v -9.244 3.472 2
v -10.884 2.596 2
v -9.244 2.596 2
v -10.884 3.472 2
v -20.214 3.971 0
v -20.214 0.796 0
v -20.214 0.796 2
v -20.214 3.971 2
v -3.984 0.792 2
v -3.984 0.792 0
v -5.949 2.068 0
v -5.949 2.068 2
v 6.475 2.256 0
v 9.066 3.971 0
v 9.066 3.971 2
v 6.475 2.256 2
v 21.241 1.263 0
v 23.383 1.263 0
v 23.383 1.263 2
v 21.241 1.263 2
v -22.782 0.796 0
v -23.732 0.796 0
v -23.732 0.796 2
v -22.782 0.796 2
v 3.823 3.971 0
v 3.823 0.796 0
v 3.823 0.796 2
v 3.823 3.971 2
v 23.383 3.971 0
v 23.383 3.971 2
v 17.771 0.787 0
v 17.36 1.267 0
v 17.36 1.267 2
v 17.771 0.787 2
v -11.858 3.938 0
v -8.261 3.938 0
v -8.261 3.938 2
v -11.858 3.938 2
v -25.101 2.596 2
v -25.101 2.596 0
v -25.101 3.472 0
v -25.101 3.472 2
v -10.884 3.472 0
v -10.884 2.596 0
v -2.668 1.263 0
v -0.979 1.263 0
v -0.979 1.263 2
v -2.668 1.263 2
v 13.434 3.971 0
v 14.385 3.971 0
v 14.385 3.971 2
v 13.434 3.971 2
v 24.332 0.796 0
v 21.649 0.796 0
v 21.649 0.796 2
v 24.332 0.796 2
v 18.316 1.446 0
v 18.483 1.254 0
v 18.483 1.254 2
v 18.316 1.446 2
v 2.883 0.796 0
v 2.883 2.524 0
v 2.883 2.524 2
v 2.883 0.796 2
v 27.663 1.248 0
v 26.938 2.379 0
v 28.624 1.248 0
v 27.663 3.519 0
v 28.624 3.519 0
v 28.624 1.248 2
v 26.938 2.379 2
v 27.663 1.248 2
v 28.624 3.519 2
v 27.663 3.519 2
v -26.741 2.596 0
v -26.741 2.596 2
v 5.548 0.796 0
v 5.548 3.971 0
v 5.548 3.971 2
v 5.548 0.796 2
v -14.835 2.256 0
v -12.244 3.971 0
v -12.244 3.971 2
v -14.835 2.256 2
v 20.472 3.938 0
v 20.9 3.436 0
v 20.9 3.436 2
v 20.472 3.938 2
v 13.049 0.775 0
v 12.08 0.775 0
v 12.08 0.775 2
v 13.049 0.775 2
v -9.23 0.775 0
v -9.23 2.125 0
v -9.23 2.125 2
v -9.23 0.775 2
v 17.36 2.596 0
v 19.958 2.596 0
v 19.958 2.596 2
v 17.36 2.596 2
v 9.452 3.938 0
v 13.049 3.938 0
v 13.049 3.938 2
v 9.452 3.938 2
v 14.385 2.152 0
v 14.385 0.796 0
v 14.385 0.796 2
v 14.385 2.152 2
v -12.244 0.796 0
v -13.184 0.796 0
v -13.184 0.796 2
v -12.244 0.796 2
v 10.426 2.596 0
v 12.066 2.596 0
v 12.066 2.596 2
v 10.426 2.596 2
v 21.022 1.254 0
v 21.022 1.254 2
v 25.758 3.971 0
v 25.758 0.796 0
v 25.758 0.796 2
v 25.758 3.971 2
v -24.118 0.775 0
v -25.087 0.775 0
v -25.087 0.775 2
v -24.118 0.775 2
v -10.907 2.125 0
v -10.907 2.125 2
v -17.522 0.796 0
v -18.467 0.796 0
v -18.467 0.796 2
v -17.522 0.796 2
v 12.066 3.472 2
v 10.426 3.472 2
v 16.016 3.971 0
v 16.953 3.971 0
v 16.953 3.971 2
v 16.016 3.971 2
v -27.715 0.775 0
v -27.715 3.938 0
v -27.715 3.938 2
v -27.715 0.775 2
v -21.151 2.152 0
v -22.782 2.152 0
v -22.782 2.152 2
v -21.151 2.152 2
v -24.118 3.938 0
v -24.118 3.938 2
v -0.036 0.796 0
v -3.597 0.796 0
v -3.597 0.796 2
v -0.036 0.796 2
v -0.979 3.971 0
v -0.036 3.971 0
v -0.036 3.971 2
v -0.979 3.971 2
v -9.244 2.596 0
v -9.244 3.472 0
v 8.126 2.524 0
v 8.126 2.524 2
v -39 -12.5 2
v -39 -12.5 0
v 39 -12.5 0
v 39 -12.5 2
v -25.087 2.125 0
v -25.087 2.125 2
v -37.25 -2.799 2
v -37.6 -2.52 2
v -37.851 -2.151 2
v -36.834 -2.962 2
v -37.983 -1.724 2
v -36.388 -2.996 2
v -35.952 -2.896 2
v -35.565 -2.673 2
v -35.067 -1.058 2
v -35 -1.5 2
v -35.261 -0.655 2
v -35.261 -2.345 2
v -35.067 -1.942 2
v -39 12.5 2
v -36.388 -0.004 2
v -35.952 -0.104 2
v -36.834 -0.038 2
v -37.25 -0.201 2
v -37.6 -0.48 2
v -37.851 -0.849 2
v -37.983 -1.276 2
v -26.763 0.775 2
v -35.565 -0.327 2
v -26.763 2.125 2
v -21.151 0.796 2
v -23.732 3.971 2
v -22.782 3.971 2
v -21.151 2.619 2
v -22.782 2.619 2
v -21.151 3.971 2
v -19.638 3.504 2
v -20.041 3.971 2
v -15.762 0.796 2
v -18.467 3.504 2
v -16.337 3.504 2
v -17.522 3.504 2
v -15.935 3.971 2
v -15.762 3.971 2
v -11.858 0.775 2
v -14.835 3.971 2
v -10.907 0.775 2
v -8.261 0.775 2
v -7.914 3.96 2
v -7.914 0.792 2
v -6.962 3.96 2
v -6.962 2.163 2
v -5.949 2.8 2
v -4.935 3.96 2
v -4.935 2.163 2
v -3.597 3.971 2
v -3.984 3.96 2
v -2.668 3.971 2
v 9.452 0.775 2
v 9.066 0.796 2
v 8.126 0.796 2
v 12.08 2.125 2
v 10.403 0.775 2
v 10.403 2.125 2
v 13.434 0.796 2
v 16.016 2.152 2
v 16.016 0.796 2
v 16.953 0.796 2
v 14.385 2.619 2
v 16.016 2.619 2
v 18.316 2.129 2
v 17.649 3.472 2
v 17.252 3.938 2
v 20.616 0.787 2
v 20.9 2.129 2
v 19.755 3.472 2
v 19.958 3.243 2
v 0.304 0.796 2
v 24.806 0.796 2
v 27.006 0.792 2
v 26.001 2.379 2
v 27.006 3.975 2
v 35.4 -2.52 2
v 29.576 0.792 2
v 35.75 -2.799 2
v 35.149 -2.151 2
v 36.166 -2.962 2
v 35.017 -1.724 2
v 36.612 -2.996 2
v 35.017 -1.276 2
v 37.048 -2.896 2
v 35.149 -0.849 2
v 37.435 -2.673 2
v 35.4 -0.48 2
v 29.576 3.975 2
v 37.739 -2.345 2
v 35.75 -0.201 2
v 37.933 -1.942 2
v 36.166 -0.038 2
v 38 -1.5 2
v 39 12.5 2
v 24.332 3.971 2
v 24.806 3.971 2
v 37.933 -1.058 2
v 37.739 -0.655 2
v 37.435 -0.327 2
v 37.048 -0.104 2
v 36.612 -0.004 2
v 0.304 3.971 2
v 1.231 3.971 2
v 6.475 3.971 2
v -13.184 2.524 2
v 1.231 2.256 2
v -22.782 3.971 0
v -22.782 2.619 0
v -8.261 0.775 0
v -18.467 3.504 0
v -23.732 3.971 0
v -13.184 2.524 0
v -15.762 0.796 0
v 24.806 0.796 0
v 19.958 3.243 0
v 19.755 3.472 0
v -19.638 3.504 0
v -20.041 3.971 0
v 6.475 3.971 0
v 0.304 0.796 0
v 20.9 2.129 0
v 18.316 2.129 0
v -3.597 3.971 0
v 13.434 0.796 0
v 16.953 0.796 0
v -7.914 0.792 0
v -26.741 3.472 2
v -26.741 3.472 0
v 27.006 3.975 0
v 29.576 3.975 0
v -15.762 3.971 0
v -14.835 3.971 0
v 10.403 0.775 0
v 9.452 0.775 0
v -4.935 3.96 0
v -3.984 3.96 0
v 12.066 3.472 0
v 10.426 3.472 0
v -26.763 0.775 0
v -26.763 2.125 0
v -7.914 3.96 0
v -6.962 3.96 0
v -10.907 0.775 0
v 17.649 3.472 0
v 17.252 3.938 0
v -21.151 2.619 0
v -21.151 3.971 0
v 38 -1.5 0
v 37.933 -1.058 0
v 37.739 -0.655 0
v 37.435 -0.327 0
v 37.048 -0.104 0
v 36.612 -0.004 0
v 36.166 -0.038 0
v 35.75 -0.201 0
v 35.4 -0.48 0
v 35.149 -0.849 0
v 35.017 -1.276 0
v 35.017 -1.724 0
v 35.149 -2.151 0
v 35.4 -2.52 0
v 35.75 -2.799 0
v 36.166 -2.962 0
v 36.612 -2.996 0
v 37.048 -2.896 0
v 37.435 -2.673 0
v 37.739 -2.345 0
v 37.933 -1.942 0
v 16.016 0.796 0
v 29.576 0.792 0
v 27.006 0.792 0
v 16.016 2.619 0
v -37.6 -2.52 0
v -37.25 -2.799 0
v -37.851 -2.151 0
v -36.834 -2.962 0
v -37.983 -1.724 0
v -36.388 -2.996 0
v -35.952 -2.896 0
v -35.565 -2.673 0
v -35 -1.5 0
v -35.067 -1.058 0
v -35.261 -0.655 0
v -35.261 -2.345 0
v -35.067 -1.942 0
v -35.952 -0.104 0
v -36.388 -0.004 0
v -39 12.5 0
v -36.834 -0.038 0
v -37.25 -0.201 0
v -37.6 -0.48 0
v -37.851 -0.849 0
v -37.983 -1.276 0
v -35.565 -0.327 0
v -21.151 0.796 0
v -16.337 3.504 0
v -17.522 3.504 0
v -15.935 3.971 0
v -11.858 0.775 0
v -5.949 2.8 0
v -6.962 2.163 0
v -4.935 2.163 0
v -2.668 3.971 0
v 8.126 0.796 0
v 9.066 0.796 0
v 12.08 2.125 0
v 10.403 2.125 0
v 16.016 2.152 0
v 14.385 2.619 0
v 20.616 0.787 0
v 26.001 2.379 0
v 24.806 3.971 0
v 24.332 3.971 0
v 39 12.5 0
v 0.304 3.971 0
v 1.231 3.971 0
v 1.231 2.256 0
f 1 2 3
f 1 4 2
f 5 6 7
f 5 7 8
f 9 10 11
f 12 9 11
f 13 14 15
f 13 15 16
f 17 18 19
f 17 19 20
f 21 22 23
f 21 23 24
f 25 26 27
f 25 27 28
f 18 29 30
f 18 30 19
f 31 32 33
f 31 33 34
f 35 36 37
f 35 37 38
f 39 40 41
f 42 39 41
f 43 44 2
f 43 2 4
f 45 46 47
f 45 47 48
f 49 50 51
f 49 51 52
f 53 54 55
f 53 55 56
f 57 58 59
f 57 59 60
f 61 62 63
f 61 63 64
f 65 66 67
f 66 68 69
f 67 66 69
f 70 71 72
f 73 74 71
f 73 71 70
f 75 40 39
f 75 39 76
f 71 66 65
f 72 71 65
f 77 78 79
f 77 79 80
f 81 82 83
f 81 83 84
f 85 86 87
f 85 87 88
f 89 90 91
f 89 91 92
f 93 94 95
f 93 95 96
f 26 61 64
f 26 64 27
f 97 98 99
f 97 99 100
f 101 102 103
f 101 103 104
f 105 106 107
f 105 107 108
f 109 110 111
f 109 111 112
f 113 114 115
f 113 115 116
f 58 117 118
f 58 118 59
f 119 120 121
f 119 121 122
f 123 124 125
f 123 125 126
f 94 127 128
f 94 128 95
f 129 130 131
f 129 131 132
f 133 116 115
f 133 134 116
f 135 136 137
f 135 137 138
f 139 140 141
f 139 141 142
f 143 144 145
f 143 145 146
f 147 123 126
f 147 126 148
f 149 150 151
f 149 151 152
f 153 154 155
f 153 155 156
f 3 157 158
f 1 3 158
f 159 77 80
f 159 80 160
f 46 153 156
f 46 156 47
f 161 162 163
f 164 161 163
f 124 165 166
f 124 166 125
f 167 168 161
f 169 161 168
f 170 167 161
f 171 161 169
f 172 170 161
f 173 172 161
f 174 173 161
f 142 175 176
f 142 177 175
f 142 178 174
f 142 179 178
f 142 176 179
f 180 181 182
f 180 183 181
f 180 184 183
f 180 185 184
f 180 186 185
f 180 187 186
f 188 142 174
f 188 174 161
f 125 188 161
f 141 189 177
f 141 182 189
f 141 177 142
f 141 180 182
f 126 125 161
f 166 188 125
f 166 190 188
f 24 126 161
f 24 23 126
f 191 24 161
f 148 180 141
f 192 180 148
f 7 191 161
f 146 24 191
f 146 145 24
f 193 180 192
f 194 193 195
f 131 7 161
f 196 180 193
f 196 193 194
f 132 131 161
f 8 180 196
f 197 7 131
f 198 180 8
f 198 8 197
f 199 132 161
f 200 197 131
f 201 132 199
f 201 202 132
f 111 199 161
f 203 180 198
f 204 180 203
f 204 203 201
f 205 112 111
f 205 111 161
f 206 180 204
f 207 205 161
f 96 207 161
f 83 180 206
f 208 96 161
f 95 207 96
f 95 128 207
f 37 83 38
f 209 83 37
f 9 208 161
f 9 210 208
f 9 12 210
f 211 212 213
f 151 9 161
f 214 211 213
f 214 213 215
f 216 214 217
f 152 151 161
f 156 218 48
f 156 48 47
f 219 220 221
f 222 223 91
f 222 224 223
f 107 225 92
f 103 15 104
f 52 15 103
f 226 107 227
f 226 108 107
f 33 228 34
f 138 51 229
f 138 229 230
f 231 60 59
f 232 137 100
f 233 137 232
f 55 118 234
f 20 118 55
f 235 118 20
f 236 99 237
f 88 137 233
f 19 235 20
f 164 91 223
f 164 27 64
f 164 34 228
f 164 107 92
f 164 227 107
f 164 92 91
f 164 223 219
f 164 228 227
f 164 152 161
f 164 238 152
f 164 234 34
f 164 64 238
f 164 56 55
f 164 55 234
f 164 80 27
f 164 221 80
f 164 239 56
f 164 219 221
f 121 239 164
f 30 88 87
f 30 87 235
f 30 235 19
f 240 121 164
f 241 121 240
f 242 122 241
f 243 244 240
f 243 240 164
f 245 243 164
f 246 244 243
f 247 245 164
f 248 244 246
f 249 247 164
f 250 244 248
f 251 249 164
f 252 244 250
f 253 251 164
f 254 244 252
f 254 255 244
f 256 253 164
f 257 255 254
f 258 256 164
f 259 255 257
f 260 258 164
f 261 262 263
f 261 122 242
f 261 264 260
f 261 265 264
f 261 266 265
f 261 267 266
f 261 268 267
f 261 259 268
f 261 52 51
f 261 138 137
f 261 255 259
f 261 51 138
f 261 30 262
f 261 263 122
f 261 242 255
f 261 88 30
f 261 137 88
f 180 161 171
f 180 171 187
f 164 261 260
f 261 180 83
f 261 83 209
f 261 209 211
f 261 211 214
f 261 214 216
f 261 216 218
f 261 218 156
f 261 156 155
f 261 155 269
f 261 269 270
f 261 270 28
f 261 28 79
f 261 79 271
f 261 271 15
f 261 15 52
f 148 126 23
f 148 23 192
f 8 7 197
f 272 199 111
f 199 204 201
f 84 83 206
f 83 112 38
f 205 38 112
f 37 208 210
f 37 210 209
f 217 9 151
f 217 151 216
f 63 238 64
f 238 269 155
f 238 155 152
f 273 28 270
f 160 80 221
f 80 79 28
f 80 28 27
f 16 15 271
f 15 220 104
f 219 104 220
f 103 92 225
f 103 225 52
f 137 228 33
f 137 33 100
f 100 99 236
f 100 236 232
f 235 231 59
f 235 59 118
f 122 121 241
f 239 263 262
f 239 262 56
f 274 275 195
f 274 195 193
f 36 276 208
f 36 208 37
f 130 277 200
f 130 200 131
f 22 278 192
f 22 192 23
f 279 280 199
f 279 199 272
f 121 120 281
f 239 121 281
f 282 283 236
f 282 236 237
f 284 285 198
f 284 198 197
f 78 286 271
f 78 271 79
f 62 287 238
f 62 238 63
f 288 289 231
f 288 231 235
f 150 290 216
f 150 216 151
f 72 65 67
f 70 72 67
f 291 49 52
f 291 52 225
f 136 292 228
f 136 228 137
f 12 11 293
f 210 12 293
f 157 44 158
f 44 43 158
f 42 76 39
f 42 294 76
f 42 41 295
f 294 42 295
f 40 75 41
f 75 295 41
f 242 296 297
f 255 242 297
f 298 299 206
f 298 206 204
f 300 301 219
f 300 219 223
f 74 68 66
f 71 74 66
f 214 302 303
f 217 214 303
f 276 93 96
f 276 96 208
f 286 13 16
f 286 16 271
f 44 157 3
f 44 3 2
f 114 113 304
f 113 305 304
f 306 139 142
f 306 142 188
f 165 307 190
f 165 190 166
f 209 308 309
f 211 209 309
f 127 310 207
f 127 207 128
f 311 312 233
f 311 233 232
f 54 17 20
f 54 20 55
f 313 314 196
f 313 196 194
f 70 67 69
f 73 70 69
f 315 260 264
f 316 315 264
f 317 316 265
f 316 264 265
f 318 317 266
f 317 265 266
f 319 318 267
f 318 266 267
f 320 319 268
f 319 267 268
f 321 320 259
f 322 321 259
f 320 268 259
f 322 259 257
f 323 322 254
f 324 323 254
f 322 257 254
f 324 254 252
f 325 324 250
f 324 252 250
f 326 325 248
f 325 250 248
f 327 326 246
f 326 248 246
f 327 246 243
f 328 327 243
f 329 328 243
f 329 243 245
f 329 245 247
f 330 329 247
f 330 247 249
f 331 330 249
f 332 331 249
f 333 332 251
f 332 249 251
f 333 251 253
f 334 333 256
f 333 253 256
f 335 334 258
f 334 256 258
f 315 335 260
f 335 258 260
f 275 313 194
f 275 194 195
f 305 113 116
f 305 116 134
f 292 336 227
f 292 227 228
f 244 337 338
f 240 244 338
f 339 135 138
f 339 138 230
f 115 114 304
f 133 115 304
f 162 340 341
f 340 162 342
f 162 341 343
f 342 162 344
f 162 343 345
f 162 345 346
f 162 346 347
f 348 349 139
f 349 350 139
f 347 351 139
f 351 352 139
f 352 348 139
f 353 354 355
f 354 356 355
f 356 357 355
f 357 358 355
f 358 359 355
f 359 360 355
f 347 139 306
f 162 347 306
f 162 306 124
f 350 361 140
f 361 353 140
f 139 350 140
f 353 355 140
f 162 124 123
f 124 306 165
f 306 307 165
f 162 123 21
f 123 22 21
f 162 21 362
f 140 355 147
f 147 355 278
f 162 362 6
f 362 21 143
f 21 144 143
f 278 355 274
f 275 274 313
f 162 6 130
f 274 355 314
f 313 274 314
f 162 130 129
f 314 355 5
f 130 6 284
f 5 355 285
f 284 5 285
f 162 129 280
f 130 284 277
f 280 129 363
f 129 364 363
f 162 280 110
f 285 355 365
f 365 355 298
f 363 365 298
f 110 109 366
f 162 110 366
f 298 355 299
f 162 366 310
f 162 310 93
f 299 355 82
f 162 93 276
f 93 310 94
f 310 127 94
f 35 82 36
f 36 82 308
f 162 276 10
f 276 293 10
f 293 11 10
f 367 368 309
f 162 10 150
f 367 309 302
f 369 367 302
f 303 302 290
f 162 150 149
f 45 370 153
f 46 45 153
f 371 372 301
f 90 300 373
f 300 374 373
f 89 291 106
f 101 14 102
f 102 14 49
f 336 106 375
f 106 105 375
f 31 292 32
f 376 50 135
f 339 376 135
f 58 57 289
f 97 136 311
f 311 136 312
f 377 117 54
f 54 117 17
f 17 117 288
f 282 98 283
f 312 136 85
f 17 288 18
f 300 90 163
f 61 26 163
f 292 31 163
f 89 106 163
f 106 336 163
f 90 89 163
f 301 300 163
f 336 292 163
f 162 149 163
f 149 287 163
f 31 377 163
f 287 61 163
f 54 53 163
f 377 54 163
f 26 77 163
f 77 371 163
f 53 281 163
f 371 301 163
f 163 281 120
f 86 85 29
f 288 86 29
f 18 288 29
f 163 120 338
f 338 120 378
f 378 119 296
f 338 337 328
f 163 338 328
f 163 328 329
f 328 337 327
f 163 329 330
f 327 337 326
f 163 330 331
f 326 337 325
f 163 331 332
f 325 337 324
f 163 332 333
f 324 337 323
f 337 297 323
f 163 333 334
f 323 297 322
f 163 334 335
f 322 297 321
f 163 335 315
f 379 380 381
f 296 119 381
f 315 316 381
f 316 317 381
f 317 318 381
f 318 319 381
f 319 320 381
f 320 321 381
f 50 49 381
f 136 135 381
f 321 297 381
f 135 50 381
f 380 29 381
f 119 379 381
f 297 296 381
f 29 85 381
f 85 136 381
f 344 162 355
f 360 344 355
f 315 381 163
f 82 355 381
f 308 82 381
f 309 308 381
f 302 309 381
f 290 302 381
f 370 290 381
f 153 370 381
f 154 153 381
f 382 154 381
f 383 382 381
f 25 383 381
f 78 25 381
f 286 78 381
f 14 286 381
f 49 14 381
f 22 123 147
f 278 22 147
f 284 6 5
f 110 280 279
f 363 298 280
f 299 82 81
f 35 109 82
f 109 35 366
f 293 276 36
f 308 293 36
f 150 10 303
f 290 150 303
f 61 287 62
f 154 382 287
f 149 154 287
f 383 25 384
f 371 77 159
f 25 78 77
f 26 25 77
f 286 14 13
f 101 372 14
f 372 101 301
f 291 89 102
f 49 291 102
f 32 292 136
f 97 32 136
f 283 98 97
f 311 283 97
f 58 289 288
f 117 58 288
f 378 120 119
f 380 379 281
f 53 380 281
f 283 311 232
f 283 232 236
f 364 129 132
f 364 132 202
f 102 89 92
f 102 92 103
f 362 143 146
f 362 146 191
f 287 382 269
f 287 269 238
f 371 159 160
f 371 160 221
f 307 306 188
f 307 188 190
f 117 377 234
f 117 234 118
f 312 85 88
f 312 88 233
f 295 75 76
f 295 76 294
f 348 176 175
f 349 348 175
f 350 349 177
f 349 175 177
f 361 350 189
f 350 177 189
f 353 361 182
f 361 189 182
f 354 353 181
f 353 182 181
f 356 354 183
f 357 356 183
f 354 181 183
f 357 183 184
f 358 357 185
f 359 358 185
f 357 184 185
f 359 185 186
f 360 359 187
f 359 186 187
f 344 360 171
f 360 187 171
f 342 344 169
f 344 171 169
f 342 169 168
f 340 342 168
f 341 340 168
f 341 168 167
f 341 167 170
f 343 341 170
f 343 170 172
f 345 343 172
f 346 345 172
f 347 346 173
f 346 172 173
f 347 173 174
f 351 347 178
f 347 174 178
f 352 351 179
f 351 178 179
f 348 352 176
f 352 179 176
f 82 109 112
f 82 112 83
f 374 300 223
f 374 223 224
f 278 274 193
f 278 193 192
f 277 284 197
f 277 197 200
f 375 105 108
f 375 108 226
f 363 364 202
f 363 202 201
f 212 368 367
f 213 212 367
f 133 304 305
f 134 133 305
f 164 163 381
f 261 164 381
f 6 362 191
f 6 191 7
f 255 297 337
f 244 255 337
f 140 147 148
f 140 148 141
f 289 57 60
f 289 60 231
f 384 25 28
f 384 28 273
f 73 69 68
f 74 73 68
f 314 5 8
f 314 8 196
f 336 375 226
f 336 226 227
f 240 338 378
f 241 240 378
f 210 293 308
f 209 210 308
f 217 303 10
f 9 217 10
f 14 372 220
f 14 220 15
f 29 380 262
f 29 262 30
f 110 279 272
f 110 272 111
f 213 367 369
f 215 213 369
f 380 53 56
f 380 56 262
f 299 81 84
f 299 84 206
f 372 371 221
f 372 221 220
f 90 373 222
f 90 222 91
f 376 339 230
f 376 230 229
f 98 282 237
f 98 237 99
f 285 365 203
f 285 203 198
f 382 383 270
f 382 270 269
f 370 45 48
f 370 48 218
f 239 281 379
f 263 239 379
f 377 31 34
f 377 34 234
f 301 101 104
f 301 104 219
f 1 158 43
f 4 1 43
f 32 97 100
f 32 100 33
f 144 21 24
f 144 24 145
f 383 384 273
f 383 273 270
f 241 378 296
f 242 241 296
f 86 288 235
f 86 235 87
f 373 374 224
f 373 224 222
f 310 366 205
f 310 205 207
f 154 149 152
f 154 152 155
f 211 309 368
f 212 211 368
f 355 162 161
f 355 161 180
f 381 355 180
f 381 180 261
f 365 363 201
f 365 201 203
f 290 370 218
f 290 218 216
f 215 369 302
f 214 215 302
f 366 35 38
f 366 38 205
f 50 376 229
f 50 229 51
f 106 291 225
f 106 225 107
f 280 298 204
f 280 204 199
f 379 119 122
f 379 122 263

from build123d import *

# Parameters (mm, degrees)
SKETCH1_W           = 78
SKETCH1_H           = 25
BOSS_EXTRUDE1_DEPTH = 2
SKETCH2_R           = 1.5
CUT_EXTRUDE1_DEPTH  = 2
SKETCH3_W           = 0.951714292
SKETCH3_H           = 3.175
SKETCH3_W_2         = 1.64005667
SKETCH3_H_2         = 0.875681432
SKETCH3_W_3         = 1.640056671
CUT_EXTRUDE2_DEPTH  = 2


with BuildPart() as part:
    # Sketch1 → Boss-Extrude1 (new body)
    with BuildSketch(Plane.XY):
        Rectangle(SKETCH1_W, SKETCH1_H)
    extrude(amount=BOSS_EXTRUDE1_DEPTH)

    # Sketch2 → Cut-Extrude1 (cut)
    with BuildSketch(Plane.XY.offset(2)):
        with Locations((-36.5, -1.5)):
            Circle(SKETCH2_R)
        with Locations((36.5, -1.5)):
            Circle(SKETCH2_R)
    extrude(amount=-CUT_EXTRUDE1_DEPTH, mode=Mode.SUBTRACT)

    # Sketch3 → Cut-Extrude2 (cut)
    # profile 1 of 15: a face of its own
    with BuildSketch(Plane(origin=(0, 0, 0), x_dir=(-1, 0, 0), z_dir=(0, 0, -1))):
        Polygon((-29.575505362, 3.974938648), (-29.575505362, 0.792073246), (-27.006387116, 0.792073246), (-26.000606506, 2.378841305), (-27.006387116, 3.974938648), align=None)
        Polygon((-28.62379107, 3.518744687), (-27.663315893, 3.518744687), (-26.938428967, 2.378841305), (-27.663315893, 1.248266567), (-28.62379107, 1.248266567), align=None, mode=Mode.SUBTRACT)
    # profile 2 of 15: a face of its own
    with BuildSketch(Plane(origin=(0, 0, 0), x_dir=(-1, 0, 0), z_dir=(0, 0, -1))):
        with Locations((-25.282306406, 2.383505947)):
            Rectangle(SKETCH3_W, SKETCH3_H)
    # profile 3 of 15: a face of its own
    with BuildSketch(Plane(origin=(0, 0, 0), x_dir=(-1, 0, 0), z_dir=(0, 0, -1))):
        Polygon((-21.240800957, 1.263179338), (-21.649435094, 0.796005947), (-24.331903974, 0.796005947), (-24.331903974, 3.971005947), (-23.383281308, 3.971005947), (-23.383281308, 1.263179338), align=None)
    # profile 4 of 15: a face of its own
    with BuildSketch(Plane(origin=(0, 0, 0), x_dir=(-1, 0, 0), z_dir=(0, 0, -1))):
        Polygon((-17.360231248, 1.266912972), (-17.770588503, 0.786863569), (-20.616032764, 0.786863569), (-21.021880599, 1.253509528), (-18.483076923, 1.253509528), (-18.316228369, 1.445625558), (-18.316228369, 2.1291916), (-20.900126248, 2.1291916), (-20.900126248, 3.435661897), (-20.471731312, 3.938198874), (-17.251731841, 3.938198874), (-17.648834152, 3.471552915), (-19.754733471, 3.471552915), (-19.957657388, 3.242555011), (-19.957657388, 2.595871483), (-17.360231248, 2.595871483), align=None)
    # profile 5 of 15: a face of its own
    with BuildSketch(Plane(origin=(0, 0, 0), x_dir=(-1, 0, 0), z_dir=(0, 0, -1))):
        Polygon((-13.434390031, 3.971005947), (-13.434390031, 0.796005947), (-14.385030255, 0.796005947), (-14.385030255, 2.152169481), (-16.015818451, 2.152169481), (-16.015818451, 0.796005947), (-16.952845922, 0.796005947), (-16.952845922, 3.971005947), (-16.015818451, 3.971005947), (-16.015818451, 2.619342872), (-14.385030255, 2.619342872), (-14.385030255, 3.971005947), align=None)
    # profile 6 of 15: a face of its own
    with BuildSketch(Plane(origin=(0, 0, 0), x_dir=(-1, 0, 0), z_dir=(0, 0, -1))):
        Polygon((-9.451803728, 3.938198874), (-9.451803728, 0.774593081), (-10.403217818, 0.774593081), (-10.403217818, 2.124694981), (-12.079518835, 2.124694981), (-12.079518835, 0.774593081), (-13.049055099, 0.774593081), (-13.049055099, 3.938198874), align=None)
        with Locations((-11.24589887, 3.033712199)):
            Rectangle(SKETCH3_W_2, SKETCH3_H_2, mode=Mode.SUBTRACT)
    # profile 7 of 15: a face of its own
    with BuildSketch(Plane(origin=(0, 0, 0), x_dir=(-1, 0, 0), z_dir=(0, 0, -1))):
        Polygon((-5.548013544, 0.796005947), (-8.12614103, 2.524093928), (-8.12614103, 0.796005947), (-9.066469435, 0.796005947), (-9.066469435, 3.971005947), (-6.474942346, 2.256489753), (-6.474942346, 3.971005947), (-5.548013544, 3.971005947), align=None)
    # profile 8 of 15: a face of its own
    with BuildSketch(Plane(origin=(0, 0, 0), x_dir=(-1, 0, 0), z_dir=(0, 0, -1))):
        Polygon((-0.304412157, 0.796005947), (-2.882539642, 2.524093928), (-2.882539642, 0.796005947), (-3.822868048, 0.796005947), (-3.822868048, 3.971005947), (-1.231340959, 2.256489753), (-1.231340959, 3.971005947), (-0.304412157, 3.971005947), align=None)
    # profile 9 of 15: a face of its own
    with BuildSketch(Plane(origin=(0, 0, 0), x_dir=(-1, 0, 0), z_dir=(0, 0, -1))):
        Polygon((3.596827915, 3.971005947), (3.596827915, 0.796005947), (0.036422573, 0.796005947), (0.036422573, 3.971005947), (0.978642439, 3.971005947), (0.978642439, 1.263179338), (2.668296333, 1.263179338), (2.668296333, 3.971005947), align=None)
    # profile 10 of 15: a face of its own
    with BuildSketch(Plane(origin=(0, 0, 0), x_dir=(-1, 0, 0), z_dir=(0, 0, -1))):
        Polygon((5.948522329, 2.06770026), (7.913622117, 0.792072606), (7.913622117, 3.960191659), (6.961908466, 3.960191659), (6.961908466, 2.162693809), (5.948522329, 2.800372577), (4.93525781, 2.162693809), (4.93525781, 3.960191659), (3.983543518, 3.960191659), (3.983543518, 0.792072606), align=None)
    # profile 11 of 15: a face of its own
    with BuildSketch(Plane(origin=(0, 0, 0), x_dir=(-1, 0, 0), z_dir=(0, 0, -1))):
        Polygon((11.858192311, 3.938198874), (11.858192311, 0.774593081), (10.90677822, 0.774593081), (10.90677822, 2.124694981), (9.230477204, 2.124694981), (9.230477204, 0.774593081), (8.26094094, 0.774593081), (8.26094094, 3.938198874), align=None)
        with Locations((10.064097169, 3.033712199)):
            Rectangle(SKETCH3_W_3, SKETCH3_H_2, mode=Mode.SUBTRACT)
    # profile 12 of 15: a face of its own
    with BuildSketch(Plane(origin=(0, 0, 0), x_dir=(-1, 0, 0), z_dir=(0, 0, -1))):
        Polygon((15.761982494, 0.796005947), (13.183855009, 2.524093928), (13.183855009, 0.796005947), (12.243526603, 0.796005947), (12.243526603, 3.971005947), (14.835053692, 2.256489753), (14.835053692, 3.971005947), (15.761982494, 3.971005947), align=None)
    # profile 13 of 15: a face of its own
    with BuildSketch(Plane(origin=(0, 0, 0), x_dir=(-1, 0, 0), z_dir=(0, 0, -1))):
        Polygon((19.638198324, 3.503797351), (18.467108571, 3.503797351), (18.467108571, 0.796005947), (17.522097922, 0.796005947), (17.522097922, 3.503797351), (16.337443423, 3.503797351), (15.93502262, 3.971005947), (20.040761226, 3.971005947), align=None)
    # profile 14 of 15: a face of its own
    with BuildSketch(Plane(origin=(0, 0, 0), x_dir=(-1, 0, 0), z_dir=(0, 0, -1))):
        Polygon((23.732256603, 3.971005947), (23.732256603, 0.796005947), (22.781616379, 0.796005947), (22.781616379, 2.152169481), (21.150828183, 2.152169481), (21.150828183, 0.796005947), (20.213800712, 0.796005947), (20.213800712, 3.971005947), (21.150828183, 3.971005947), (21.150828183, 2.619342872), (22.781616379, 2.619342872), (22.781616379, 3.971005947), align=None)
    # profile 15 of 15: a face of its own
    with BuildSketch(Plane(origin=(0, 0, 0), x_dir=(-1, 0, 0), z_dir=(0, 0, -1))):
        Polygon((27.714842907, 3.938198874), (27.714842907, 0.774593081), (26.763428816, 0.774593081), (26.763428816, 2.124694981), (25.087127799, 2.124694981), (25.087127799, 0.774593081), (24.117591535, 0.774593081), (24.117591535, 3.938198874), align=None)
        with Locations((25.920747764, 3.033712199)):
            Rectangle(SKETCH3_W_2, SKETCH3_H_2, mode=Mode.SUBTRACT)
    extrude(amount=-CUT_EXTRUDE2_DEPTH, mode=Mode.SUBTRACT)


with BuildPart() as cut_extrude2_piece_1:
    # of the separate pieces the step leaves, piece 1, a body of its own (cut_extrude2_pieces)
    add(part.part.solids().sort_by_distance((-39, 12.5, 0))[0])


with BuildPart() as cut_extrude2_piece_2:
    # of the separate pieces the step leaves, piece 2, a body of its own (cut_extrude2_pieces)
    add(part.part.solids().sort_by_distance((28.62379107, 3.518744687, 0))[0])


with BuildPart() as cut_extrude2_piece_3:
    # of the separate pieces the step leaves, piece 3, a body of its own (cut_extrude2_pieces)
    add(part.part.solids().sort_by_distance((10.425870535, 3.471552915, 0))[0])


with BuildPart() as cut_extrude2_piece_4:
    # of the separate pieces the step leaves, piece 4, a body of its own (cut_extrude2_pieces)
    add(part.part.solids().sort_by_distance((-10.884125504, 3.471552915, 0))[0])


with BuildPart() as cut_extrude2_piece_5:
    # of the separate pieces the step leaves, piece 5, a body of its own (cut_extrude2_pieces)
    add(part.part.solids().sort_by_distance((-26.740776099, 3.471552915, 0))[0])


solid = Compound([cut_extrude2_piece_1.part, cut_extrude2_piece_2.part, cut_extrude2_piece_3.part, cut_extrude2_piece_4.part, cut_extrude2_piece_5.part])
